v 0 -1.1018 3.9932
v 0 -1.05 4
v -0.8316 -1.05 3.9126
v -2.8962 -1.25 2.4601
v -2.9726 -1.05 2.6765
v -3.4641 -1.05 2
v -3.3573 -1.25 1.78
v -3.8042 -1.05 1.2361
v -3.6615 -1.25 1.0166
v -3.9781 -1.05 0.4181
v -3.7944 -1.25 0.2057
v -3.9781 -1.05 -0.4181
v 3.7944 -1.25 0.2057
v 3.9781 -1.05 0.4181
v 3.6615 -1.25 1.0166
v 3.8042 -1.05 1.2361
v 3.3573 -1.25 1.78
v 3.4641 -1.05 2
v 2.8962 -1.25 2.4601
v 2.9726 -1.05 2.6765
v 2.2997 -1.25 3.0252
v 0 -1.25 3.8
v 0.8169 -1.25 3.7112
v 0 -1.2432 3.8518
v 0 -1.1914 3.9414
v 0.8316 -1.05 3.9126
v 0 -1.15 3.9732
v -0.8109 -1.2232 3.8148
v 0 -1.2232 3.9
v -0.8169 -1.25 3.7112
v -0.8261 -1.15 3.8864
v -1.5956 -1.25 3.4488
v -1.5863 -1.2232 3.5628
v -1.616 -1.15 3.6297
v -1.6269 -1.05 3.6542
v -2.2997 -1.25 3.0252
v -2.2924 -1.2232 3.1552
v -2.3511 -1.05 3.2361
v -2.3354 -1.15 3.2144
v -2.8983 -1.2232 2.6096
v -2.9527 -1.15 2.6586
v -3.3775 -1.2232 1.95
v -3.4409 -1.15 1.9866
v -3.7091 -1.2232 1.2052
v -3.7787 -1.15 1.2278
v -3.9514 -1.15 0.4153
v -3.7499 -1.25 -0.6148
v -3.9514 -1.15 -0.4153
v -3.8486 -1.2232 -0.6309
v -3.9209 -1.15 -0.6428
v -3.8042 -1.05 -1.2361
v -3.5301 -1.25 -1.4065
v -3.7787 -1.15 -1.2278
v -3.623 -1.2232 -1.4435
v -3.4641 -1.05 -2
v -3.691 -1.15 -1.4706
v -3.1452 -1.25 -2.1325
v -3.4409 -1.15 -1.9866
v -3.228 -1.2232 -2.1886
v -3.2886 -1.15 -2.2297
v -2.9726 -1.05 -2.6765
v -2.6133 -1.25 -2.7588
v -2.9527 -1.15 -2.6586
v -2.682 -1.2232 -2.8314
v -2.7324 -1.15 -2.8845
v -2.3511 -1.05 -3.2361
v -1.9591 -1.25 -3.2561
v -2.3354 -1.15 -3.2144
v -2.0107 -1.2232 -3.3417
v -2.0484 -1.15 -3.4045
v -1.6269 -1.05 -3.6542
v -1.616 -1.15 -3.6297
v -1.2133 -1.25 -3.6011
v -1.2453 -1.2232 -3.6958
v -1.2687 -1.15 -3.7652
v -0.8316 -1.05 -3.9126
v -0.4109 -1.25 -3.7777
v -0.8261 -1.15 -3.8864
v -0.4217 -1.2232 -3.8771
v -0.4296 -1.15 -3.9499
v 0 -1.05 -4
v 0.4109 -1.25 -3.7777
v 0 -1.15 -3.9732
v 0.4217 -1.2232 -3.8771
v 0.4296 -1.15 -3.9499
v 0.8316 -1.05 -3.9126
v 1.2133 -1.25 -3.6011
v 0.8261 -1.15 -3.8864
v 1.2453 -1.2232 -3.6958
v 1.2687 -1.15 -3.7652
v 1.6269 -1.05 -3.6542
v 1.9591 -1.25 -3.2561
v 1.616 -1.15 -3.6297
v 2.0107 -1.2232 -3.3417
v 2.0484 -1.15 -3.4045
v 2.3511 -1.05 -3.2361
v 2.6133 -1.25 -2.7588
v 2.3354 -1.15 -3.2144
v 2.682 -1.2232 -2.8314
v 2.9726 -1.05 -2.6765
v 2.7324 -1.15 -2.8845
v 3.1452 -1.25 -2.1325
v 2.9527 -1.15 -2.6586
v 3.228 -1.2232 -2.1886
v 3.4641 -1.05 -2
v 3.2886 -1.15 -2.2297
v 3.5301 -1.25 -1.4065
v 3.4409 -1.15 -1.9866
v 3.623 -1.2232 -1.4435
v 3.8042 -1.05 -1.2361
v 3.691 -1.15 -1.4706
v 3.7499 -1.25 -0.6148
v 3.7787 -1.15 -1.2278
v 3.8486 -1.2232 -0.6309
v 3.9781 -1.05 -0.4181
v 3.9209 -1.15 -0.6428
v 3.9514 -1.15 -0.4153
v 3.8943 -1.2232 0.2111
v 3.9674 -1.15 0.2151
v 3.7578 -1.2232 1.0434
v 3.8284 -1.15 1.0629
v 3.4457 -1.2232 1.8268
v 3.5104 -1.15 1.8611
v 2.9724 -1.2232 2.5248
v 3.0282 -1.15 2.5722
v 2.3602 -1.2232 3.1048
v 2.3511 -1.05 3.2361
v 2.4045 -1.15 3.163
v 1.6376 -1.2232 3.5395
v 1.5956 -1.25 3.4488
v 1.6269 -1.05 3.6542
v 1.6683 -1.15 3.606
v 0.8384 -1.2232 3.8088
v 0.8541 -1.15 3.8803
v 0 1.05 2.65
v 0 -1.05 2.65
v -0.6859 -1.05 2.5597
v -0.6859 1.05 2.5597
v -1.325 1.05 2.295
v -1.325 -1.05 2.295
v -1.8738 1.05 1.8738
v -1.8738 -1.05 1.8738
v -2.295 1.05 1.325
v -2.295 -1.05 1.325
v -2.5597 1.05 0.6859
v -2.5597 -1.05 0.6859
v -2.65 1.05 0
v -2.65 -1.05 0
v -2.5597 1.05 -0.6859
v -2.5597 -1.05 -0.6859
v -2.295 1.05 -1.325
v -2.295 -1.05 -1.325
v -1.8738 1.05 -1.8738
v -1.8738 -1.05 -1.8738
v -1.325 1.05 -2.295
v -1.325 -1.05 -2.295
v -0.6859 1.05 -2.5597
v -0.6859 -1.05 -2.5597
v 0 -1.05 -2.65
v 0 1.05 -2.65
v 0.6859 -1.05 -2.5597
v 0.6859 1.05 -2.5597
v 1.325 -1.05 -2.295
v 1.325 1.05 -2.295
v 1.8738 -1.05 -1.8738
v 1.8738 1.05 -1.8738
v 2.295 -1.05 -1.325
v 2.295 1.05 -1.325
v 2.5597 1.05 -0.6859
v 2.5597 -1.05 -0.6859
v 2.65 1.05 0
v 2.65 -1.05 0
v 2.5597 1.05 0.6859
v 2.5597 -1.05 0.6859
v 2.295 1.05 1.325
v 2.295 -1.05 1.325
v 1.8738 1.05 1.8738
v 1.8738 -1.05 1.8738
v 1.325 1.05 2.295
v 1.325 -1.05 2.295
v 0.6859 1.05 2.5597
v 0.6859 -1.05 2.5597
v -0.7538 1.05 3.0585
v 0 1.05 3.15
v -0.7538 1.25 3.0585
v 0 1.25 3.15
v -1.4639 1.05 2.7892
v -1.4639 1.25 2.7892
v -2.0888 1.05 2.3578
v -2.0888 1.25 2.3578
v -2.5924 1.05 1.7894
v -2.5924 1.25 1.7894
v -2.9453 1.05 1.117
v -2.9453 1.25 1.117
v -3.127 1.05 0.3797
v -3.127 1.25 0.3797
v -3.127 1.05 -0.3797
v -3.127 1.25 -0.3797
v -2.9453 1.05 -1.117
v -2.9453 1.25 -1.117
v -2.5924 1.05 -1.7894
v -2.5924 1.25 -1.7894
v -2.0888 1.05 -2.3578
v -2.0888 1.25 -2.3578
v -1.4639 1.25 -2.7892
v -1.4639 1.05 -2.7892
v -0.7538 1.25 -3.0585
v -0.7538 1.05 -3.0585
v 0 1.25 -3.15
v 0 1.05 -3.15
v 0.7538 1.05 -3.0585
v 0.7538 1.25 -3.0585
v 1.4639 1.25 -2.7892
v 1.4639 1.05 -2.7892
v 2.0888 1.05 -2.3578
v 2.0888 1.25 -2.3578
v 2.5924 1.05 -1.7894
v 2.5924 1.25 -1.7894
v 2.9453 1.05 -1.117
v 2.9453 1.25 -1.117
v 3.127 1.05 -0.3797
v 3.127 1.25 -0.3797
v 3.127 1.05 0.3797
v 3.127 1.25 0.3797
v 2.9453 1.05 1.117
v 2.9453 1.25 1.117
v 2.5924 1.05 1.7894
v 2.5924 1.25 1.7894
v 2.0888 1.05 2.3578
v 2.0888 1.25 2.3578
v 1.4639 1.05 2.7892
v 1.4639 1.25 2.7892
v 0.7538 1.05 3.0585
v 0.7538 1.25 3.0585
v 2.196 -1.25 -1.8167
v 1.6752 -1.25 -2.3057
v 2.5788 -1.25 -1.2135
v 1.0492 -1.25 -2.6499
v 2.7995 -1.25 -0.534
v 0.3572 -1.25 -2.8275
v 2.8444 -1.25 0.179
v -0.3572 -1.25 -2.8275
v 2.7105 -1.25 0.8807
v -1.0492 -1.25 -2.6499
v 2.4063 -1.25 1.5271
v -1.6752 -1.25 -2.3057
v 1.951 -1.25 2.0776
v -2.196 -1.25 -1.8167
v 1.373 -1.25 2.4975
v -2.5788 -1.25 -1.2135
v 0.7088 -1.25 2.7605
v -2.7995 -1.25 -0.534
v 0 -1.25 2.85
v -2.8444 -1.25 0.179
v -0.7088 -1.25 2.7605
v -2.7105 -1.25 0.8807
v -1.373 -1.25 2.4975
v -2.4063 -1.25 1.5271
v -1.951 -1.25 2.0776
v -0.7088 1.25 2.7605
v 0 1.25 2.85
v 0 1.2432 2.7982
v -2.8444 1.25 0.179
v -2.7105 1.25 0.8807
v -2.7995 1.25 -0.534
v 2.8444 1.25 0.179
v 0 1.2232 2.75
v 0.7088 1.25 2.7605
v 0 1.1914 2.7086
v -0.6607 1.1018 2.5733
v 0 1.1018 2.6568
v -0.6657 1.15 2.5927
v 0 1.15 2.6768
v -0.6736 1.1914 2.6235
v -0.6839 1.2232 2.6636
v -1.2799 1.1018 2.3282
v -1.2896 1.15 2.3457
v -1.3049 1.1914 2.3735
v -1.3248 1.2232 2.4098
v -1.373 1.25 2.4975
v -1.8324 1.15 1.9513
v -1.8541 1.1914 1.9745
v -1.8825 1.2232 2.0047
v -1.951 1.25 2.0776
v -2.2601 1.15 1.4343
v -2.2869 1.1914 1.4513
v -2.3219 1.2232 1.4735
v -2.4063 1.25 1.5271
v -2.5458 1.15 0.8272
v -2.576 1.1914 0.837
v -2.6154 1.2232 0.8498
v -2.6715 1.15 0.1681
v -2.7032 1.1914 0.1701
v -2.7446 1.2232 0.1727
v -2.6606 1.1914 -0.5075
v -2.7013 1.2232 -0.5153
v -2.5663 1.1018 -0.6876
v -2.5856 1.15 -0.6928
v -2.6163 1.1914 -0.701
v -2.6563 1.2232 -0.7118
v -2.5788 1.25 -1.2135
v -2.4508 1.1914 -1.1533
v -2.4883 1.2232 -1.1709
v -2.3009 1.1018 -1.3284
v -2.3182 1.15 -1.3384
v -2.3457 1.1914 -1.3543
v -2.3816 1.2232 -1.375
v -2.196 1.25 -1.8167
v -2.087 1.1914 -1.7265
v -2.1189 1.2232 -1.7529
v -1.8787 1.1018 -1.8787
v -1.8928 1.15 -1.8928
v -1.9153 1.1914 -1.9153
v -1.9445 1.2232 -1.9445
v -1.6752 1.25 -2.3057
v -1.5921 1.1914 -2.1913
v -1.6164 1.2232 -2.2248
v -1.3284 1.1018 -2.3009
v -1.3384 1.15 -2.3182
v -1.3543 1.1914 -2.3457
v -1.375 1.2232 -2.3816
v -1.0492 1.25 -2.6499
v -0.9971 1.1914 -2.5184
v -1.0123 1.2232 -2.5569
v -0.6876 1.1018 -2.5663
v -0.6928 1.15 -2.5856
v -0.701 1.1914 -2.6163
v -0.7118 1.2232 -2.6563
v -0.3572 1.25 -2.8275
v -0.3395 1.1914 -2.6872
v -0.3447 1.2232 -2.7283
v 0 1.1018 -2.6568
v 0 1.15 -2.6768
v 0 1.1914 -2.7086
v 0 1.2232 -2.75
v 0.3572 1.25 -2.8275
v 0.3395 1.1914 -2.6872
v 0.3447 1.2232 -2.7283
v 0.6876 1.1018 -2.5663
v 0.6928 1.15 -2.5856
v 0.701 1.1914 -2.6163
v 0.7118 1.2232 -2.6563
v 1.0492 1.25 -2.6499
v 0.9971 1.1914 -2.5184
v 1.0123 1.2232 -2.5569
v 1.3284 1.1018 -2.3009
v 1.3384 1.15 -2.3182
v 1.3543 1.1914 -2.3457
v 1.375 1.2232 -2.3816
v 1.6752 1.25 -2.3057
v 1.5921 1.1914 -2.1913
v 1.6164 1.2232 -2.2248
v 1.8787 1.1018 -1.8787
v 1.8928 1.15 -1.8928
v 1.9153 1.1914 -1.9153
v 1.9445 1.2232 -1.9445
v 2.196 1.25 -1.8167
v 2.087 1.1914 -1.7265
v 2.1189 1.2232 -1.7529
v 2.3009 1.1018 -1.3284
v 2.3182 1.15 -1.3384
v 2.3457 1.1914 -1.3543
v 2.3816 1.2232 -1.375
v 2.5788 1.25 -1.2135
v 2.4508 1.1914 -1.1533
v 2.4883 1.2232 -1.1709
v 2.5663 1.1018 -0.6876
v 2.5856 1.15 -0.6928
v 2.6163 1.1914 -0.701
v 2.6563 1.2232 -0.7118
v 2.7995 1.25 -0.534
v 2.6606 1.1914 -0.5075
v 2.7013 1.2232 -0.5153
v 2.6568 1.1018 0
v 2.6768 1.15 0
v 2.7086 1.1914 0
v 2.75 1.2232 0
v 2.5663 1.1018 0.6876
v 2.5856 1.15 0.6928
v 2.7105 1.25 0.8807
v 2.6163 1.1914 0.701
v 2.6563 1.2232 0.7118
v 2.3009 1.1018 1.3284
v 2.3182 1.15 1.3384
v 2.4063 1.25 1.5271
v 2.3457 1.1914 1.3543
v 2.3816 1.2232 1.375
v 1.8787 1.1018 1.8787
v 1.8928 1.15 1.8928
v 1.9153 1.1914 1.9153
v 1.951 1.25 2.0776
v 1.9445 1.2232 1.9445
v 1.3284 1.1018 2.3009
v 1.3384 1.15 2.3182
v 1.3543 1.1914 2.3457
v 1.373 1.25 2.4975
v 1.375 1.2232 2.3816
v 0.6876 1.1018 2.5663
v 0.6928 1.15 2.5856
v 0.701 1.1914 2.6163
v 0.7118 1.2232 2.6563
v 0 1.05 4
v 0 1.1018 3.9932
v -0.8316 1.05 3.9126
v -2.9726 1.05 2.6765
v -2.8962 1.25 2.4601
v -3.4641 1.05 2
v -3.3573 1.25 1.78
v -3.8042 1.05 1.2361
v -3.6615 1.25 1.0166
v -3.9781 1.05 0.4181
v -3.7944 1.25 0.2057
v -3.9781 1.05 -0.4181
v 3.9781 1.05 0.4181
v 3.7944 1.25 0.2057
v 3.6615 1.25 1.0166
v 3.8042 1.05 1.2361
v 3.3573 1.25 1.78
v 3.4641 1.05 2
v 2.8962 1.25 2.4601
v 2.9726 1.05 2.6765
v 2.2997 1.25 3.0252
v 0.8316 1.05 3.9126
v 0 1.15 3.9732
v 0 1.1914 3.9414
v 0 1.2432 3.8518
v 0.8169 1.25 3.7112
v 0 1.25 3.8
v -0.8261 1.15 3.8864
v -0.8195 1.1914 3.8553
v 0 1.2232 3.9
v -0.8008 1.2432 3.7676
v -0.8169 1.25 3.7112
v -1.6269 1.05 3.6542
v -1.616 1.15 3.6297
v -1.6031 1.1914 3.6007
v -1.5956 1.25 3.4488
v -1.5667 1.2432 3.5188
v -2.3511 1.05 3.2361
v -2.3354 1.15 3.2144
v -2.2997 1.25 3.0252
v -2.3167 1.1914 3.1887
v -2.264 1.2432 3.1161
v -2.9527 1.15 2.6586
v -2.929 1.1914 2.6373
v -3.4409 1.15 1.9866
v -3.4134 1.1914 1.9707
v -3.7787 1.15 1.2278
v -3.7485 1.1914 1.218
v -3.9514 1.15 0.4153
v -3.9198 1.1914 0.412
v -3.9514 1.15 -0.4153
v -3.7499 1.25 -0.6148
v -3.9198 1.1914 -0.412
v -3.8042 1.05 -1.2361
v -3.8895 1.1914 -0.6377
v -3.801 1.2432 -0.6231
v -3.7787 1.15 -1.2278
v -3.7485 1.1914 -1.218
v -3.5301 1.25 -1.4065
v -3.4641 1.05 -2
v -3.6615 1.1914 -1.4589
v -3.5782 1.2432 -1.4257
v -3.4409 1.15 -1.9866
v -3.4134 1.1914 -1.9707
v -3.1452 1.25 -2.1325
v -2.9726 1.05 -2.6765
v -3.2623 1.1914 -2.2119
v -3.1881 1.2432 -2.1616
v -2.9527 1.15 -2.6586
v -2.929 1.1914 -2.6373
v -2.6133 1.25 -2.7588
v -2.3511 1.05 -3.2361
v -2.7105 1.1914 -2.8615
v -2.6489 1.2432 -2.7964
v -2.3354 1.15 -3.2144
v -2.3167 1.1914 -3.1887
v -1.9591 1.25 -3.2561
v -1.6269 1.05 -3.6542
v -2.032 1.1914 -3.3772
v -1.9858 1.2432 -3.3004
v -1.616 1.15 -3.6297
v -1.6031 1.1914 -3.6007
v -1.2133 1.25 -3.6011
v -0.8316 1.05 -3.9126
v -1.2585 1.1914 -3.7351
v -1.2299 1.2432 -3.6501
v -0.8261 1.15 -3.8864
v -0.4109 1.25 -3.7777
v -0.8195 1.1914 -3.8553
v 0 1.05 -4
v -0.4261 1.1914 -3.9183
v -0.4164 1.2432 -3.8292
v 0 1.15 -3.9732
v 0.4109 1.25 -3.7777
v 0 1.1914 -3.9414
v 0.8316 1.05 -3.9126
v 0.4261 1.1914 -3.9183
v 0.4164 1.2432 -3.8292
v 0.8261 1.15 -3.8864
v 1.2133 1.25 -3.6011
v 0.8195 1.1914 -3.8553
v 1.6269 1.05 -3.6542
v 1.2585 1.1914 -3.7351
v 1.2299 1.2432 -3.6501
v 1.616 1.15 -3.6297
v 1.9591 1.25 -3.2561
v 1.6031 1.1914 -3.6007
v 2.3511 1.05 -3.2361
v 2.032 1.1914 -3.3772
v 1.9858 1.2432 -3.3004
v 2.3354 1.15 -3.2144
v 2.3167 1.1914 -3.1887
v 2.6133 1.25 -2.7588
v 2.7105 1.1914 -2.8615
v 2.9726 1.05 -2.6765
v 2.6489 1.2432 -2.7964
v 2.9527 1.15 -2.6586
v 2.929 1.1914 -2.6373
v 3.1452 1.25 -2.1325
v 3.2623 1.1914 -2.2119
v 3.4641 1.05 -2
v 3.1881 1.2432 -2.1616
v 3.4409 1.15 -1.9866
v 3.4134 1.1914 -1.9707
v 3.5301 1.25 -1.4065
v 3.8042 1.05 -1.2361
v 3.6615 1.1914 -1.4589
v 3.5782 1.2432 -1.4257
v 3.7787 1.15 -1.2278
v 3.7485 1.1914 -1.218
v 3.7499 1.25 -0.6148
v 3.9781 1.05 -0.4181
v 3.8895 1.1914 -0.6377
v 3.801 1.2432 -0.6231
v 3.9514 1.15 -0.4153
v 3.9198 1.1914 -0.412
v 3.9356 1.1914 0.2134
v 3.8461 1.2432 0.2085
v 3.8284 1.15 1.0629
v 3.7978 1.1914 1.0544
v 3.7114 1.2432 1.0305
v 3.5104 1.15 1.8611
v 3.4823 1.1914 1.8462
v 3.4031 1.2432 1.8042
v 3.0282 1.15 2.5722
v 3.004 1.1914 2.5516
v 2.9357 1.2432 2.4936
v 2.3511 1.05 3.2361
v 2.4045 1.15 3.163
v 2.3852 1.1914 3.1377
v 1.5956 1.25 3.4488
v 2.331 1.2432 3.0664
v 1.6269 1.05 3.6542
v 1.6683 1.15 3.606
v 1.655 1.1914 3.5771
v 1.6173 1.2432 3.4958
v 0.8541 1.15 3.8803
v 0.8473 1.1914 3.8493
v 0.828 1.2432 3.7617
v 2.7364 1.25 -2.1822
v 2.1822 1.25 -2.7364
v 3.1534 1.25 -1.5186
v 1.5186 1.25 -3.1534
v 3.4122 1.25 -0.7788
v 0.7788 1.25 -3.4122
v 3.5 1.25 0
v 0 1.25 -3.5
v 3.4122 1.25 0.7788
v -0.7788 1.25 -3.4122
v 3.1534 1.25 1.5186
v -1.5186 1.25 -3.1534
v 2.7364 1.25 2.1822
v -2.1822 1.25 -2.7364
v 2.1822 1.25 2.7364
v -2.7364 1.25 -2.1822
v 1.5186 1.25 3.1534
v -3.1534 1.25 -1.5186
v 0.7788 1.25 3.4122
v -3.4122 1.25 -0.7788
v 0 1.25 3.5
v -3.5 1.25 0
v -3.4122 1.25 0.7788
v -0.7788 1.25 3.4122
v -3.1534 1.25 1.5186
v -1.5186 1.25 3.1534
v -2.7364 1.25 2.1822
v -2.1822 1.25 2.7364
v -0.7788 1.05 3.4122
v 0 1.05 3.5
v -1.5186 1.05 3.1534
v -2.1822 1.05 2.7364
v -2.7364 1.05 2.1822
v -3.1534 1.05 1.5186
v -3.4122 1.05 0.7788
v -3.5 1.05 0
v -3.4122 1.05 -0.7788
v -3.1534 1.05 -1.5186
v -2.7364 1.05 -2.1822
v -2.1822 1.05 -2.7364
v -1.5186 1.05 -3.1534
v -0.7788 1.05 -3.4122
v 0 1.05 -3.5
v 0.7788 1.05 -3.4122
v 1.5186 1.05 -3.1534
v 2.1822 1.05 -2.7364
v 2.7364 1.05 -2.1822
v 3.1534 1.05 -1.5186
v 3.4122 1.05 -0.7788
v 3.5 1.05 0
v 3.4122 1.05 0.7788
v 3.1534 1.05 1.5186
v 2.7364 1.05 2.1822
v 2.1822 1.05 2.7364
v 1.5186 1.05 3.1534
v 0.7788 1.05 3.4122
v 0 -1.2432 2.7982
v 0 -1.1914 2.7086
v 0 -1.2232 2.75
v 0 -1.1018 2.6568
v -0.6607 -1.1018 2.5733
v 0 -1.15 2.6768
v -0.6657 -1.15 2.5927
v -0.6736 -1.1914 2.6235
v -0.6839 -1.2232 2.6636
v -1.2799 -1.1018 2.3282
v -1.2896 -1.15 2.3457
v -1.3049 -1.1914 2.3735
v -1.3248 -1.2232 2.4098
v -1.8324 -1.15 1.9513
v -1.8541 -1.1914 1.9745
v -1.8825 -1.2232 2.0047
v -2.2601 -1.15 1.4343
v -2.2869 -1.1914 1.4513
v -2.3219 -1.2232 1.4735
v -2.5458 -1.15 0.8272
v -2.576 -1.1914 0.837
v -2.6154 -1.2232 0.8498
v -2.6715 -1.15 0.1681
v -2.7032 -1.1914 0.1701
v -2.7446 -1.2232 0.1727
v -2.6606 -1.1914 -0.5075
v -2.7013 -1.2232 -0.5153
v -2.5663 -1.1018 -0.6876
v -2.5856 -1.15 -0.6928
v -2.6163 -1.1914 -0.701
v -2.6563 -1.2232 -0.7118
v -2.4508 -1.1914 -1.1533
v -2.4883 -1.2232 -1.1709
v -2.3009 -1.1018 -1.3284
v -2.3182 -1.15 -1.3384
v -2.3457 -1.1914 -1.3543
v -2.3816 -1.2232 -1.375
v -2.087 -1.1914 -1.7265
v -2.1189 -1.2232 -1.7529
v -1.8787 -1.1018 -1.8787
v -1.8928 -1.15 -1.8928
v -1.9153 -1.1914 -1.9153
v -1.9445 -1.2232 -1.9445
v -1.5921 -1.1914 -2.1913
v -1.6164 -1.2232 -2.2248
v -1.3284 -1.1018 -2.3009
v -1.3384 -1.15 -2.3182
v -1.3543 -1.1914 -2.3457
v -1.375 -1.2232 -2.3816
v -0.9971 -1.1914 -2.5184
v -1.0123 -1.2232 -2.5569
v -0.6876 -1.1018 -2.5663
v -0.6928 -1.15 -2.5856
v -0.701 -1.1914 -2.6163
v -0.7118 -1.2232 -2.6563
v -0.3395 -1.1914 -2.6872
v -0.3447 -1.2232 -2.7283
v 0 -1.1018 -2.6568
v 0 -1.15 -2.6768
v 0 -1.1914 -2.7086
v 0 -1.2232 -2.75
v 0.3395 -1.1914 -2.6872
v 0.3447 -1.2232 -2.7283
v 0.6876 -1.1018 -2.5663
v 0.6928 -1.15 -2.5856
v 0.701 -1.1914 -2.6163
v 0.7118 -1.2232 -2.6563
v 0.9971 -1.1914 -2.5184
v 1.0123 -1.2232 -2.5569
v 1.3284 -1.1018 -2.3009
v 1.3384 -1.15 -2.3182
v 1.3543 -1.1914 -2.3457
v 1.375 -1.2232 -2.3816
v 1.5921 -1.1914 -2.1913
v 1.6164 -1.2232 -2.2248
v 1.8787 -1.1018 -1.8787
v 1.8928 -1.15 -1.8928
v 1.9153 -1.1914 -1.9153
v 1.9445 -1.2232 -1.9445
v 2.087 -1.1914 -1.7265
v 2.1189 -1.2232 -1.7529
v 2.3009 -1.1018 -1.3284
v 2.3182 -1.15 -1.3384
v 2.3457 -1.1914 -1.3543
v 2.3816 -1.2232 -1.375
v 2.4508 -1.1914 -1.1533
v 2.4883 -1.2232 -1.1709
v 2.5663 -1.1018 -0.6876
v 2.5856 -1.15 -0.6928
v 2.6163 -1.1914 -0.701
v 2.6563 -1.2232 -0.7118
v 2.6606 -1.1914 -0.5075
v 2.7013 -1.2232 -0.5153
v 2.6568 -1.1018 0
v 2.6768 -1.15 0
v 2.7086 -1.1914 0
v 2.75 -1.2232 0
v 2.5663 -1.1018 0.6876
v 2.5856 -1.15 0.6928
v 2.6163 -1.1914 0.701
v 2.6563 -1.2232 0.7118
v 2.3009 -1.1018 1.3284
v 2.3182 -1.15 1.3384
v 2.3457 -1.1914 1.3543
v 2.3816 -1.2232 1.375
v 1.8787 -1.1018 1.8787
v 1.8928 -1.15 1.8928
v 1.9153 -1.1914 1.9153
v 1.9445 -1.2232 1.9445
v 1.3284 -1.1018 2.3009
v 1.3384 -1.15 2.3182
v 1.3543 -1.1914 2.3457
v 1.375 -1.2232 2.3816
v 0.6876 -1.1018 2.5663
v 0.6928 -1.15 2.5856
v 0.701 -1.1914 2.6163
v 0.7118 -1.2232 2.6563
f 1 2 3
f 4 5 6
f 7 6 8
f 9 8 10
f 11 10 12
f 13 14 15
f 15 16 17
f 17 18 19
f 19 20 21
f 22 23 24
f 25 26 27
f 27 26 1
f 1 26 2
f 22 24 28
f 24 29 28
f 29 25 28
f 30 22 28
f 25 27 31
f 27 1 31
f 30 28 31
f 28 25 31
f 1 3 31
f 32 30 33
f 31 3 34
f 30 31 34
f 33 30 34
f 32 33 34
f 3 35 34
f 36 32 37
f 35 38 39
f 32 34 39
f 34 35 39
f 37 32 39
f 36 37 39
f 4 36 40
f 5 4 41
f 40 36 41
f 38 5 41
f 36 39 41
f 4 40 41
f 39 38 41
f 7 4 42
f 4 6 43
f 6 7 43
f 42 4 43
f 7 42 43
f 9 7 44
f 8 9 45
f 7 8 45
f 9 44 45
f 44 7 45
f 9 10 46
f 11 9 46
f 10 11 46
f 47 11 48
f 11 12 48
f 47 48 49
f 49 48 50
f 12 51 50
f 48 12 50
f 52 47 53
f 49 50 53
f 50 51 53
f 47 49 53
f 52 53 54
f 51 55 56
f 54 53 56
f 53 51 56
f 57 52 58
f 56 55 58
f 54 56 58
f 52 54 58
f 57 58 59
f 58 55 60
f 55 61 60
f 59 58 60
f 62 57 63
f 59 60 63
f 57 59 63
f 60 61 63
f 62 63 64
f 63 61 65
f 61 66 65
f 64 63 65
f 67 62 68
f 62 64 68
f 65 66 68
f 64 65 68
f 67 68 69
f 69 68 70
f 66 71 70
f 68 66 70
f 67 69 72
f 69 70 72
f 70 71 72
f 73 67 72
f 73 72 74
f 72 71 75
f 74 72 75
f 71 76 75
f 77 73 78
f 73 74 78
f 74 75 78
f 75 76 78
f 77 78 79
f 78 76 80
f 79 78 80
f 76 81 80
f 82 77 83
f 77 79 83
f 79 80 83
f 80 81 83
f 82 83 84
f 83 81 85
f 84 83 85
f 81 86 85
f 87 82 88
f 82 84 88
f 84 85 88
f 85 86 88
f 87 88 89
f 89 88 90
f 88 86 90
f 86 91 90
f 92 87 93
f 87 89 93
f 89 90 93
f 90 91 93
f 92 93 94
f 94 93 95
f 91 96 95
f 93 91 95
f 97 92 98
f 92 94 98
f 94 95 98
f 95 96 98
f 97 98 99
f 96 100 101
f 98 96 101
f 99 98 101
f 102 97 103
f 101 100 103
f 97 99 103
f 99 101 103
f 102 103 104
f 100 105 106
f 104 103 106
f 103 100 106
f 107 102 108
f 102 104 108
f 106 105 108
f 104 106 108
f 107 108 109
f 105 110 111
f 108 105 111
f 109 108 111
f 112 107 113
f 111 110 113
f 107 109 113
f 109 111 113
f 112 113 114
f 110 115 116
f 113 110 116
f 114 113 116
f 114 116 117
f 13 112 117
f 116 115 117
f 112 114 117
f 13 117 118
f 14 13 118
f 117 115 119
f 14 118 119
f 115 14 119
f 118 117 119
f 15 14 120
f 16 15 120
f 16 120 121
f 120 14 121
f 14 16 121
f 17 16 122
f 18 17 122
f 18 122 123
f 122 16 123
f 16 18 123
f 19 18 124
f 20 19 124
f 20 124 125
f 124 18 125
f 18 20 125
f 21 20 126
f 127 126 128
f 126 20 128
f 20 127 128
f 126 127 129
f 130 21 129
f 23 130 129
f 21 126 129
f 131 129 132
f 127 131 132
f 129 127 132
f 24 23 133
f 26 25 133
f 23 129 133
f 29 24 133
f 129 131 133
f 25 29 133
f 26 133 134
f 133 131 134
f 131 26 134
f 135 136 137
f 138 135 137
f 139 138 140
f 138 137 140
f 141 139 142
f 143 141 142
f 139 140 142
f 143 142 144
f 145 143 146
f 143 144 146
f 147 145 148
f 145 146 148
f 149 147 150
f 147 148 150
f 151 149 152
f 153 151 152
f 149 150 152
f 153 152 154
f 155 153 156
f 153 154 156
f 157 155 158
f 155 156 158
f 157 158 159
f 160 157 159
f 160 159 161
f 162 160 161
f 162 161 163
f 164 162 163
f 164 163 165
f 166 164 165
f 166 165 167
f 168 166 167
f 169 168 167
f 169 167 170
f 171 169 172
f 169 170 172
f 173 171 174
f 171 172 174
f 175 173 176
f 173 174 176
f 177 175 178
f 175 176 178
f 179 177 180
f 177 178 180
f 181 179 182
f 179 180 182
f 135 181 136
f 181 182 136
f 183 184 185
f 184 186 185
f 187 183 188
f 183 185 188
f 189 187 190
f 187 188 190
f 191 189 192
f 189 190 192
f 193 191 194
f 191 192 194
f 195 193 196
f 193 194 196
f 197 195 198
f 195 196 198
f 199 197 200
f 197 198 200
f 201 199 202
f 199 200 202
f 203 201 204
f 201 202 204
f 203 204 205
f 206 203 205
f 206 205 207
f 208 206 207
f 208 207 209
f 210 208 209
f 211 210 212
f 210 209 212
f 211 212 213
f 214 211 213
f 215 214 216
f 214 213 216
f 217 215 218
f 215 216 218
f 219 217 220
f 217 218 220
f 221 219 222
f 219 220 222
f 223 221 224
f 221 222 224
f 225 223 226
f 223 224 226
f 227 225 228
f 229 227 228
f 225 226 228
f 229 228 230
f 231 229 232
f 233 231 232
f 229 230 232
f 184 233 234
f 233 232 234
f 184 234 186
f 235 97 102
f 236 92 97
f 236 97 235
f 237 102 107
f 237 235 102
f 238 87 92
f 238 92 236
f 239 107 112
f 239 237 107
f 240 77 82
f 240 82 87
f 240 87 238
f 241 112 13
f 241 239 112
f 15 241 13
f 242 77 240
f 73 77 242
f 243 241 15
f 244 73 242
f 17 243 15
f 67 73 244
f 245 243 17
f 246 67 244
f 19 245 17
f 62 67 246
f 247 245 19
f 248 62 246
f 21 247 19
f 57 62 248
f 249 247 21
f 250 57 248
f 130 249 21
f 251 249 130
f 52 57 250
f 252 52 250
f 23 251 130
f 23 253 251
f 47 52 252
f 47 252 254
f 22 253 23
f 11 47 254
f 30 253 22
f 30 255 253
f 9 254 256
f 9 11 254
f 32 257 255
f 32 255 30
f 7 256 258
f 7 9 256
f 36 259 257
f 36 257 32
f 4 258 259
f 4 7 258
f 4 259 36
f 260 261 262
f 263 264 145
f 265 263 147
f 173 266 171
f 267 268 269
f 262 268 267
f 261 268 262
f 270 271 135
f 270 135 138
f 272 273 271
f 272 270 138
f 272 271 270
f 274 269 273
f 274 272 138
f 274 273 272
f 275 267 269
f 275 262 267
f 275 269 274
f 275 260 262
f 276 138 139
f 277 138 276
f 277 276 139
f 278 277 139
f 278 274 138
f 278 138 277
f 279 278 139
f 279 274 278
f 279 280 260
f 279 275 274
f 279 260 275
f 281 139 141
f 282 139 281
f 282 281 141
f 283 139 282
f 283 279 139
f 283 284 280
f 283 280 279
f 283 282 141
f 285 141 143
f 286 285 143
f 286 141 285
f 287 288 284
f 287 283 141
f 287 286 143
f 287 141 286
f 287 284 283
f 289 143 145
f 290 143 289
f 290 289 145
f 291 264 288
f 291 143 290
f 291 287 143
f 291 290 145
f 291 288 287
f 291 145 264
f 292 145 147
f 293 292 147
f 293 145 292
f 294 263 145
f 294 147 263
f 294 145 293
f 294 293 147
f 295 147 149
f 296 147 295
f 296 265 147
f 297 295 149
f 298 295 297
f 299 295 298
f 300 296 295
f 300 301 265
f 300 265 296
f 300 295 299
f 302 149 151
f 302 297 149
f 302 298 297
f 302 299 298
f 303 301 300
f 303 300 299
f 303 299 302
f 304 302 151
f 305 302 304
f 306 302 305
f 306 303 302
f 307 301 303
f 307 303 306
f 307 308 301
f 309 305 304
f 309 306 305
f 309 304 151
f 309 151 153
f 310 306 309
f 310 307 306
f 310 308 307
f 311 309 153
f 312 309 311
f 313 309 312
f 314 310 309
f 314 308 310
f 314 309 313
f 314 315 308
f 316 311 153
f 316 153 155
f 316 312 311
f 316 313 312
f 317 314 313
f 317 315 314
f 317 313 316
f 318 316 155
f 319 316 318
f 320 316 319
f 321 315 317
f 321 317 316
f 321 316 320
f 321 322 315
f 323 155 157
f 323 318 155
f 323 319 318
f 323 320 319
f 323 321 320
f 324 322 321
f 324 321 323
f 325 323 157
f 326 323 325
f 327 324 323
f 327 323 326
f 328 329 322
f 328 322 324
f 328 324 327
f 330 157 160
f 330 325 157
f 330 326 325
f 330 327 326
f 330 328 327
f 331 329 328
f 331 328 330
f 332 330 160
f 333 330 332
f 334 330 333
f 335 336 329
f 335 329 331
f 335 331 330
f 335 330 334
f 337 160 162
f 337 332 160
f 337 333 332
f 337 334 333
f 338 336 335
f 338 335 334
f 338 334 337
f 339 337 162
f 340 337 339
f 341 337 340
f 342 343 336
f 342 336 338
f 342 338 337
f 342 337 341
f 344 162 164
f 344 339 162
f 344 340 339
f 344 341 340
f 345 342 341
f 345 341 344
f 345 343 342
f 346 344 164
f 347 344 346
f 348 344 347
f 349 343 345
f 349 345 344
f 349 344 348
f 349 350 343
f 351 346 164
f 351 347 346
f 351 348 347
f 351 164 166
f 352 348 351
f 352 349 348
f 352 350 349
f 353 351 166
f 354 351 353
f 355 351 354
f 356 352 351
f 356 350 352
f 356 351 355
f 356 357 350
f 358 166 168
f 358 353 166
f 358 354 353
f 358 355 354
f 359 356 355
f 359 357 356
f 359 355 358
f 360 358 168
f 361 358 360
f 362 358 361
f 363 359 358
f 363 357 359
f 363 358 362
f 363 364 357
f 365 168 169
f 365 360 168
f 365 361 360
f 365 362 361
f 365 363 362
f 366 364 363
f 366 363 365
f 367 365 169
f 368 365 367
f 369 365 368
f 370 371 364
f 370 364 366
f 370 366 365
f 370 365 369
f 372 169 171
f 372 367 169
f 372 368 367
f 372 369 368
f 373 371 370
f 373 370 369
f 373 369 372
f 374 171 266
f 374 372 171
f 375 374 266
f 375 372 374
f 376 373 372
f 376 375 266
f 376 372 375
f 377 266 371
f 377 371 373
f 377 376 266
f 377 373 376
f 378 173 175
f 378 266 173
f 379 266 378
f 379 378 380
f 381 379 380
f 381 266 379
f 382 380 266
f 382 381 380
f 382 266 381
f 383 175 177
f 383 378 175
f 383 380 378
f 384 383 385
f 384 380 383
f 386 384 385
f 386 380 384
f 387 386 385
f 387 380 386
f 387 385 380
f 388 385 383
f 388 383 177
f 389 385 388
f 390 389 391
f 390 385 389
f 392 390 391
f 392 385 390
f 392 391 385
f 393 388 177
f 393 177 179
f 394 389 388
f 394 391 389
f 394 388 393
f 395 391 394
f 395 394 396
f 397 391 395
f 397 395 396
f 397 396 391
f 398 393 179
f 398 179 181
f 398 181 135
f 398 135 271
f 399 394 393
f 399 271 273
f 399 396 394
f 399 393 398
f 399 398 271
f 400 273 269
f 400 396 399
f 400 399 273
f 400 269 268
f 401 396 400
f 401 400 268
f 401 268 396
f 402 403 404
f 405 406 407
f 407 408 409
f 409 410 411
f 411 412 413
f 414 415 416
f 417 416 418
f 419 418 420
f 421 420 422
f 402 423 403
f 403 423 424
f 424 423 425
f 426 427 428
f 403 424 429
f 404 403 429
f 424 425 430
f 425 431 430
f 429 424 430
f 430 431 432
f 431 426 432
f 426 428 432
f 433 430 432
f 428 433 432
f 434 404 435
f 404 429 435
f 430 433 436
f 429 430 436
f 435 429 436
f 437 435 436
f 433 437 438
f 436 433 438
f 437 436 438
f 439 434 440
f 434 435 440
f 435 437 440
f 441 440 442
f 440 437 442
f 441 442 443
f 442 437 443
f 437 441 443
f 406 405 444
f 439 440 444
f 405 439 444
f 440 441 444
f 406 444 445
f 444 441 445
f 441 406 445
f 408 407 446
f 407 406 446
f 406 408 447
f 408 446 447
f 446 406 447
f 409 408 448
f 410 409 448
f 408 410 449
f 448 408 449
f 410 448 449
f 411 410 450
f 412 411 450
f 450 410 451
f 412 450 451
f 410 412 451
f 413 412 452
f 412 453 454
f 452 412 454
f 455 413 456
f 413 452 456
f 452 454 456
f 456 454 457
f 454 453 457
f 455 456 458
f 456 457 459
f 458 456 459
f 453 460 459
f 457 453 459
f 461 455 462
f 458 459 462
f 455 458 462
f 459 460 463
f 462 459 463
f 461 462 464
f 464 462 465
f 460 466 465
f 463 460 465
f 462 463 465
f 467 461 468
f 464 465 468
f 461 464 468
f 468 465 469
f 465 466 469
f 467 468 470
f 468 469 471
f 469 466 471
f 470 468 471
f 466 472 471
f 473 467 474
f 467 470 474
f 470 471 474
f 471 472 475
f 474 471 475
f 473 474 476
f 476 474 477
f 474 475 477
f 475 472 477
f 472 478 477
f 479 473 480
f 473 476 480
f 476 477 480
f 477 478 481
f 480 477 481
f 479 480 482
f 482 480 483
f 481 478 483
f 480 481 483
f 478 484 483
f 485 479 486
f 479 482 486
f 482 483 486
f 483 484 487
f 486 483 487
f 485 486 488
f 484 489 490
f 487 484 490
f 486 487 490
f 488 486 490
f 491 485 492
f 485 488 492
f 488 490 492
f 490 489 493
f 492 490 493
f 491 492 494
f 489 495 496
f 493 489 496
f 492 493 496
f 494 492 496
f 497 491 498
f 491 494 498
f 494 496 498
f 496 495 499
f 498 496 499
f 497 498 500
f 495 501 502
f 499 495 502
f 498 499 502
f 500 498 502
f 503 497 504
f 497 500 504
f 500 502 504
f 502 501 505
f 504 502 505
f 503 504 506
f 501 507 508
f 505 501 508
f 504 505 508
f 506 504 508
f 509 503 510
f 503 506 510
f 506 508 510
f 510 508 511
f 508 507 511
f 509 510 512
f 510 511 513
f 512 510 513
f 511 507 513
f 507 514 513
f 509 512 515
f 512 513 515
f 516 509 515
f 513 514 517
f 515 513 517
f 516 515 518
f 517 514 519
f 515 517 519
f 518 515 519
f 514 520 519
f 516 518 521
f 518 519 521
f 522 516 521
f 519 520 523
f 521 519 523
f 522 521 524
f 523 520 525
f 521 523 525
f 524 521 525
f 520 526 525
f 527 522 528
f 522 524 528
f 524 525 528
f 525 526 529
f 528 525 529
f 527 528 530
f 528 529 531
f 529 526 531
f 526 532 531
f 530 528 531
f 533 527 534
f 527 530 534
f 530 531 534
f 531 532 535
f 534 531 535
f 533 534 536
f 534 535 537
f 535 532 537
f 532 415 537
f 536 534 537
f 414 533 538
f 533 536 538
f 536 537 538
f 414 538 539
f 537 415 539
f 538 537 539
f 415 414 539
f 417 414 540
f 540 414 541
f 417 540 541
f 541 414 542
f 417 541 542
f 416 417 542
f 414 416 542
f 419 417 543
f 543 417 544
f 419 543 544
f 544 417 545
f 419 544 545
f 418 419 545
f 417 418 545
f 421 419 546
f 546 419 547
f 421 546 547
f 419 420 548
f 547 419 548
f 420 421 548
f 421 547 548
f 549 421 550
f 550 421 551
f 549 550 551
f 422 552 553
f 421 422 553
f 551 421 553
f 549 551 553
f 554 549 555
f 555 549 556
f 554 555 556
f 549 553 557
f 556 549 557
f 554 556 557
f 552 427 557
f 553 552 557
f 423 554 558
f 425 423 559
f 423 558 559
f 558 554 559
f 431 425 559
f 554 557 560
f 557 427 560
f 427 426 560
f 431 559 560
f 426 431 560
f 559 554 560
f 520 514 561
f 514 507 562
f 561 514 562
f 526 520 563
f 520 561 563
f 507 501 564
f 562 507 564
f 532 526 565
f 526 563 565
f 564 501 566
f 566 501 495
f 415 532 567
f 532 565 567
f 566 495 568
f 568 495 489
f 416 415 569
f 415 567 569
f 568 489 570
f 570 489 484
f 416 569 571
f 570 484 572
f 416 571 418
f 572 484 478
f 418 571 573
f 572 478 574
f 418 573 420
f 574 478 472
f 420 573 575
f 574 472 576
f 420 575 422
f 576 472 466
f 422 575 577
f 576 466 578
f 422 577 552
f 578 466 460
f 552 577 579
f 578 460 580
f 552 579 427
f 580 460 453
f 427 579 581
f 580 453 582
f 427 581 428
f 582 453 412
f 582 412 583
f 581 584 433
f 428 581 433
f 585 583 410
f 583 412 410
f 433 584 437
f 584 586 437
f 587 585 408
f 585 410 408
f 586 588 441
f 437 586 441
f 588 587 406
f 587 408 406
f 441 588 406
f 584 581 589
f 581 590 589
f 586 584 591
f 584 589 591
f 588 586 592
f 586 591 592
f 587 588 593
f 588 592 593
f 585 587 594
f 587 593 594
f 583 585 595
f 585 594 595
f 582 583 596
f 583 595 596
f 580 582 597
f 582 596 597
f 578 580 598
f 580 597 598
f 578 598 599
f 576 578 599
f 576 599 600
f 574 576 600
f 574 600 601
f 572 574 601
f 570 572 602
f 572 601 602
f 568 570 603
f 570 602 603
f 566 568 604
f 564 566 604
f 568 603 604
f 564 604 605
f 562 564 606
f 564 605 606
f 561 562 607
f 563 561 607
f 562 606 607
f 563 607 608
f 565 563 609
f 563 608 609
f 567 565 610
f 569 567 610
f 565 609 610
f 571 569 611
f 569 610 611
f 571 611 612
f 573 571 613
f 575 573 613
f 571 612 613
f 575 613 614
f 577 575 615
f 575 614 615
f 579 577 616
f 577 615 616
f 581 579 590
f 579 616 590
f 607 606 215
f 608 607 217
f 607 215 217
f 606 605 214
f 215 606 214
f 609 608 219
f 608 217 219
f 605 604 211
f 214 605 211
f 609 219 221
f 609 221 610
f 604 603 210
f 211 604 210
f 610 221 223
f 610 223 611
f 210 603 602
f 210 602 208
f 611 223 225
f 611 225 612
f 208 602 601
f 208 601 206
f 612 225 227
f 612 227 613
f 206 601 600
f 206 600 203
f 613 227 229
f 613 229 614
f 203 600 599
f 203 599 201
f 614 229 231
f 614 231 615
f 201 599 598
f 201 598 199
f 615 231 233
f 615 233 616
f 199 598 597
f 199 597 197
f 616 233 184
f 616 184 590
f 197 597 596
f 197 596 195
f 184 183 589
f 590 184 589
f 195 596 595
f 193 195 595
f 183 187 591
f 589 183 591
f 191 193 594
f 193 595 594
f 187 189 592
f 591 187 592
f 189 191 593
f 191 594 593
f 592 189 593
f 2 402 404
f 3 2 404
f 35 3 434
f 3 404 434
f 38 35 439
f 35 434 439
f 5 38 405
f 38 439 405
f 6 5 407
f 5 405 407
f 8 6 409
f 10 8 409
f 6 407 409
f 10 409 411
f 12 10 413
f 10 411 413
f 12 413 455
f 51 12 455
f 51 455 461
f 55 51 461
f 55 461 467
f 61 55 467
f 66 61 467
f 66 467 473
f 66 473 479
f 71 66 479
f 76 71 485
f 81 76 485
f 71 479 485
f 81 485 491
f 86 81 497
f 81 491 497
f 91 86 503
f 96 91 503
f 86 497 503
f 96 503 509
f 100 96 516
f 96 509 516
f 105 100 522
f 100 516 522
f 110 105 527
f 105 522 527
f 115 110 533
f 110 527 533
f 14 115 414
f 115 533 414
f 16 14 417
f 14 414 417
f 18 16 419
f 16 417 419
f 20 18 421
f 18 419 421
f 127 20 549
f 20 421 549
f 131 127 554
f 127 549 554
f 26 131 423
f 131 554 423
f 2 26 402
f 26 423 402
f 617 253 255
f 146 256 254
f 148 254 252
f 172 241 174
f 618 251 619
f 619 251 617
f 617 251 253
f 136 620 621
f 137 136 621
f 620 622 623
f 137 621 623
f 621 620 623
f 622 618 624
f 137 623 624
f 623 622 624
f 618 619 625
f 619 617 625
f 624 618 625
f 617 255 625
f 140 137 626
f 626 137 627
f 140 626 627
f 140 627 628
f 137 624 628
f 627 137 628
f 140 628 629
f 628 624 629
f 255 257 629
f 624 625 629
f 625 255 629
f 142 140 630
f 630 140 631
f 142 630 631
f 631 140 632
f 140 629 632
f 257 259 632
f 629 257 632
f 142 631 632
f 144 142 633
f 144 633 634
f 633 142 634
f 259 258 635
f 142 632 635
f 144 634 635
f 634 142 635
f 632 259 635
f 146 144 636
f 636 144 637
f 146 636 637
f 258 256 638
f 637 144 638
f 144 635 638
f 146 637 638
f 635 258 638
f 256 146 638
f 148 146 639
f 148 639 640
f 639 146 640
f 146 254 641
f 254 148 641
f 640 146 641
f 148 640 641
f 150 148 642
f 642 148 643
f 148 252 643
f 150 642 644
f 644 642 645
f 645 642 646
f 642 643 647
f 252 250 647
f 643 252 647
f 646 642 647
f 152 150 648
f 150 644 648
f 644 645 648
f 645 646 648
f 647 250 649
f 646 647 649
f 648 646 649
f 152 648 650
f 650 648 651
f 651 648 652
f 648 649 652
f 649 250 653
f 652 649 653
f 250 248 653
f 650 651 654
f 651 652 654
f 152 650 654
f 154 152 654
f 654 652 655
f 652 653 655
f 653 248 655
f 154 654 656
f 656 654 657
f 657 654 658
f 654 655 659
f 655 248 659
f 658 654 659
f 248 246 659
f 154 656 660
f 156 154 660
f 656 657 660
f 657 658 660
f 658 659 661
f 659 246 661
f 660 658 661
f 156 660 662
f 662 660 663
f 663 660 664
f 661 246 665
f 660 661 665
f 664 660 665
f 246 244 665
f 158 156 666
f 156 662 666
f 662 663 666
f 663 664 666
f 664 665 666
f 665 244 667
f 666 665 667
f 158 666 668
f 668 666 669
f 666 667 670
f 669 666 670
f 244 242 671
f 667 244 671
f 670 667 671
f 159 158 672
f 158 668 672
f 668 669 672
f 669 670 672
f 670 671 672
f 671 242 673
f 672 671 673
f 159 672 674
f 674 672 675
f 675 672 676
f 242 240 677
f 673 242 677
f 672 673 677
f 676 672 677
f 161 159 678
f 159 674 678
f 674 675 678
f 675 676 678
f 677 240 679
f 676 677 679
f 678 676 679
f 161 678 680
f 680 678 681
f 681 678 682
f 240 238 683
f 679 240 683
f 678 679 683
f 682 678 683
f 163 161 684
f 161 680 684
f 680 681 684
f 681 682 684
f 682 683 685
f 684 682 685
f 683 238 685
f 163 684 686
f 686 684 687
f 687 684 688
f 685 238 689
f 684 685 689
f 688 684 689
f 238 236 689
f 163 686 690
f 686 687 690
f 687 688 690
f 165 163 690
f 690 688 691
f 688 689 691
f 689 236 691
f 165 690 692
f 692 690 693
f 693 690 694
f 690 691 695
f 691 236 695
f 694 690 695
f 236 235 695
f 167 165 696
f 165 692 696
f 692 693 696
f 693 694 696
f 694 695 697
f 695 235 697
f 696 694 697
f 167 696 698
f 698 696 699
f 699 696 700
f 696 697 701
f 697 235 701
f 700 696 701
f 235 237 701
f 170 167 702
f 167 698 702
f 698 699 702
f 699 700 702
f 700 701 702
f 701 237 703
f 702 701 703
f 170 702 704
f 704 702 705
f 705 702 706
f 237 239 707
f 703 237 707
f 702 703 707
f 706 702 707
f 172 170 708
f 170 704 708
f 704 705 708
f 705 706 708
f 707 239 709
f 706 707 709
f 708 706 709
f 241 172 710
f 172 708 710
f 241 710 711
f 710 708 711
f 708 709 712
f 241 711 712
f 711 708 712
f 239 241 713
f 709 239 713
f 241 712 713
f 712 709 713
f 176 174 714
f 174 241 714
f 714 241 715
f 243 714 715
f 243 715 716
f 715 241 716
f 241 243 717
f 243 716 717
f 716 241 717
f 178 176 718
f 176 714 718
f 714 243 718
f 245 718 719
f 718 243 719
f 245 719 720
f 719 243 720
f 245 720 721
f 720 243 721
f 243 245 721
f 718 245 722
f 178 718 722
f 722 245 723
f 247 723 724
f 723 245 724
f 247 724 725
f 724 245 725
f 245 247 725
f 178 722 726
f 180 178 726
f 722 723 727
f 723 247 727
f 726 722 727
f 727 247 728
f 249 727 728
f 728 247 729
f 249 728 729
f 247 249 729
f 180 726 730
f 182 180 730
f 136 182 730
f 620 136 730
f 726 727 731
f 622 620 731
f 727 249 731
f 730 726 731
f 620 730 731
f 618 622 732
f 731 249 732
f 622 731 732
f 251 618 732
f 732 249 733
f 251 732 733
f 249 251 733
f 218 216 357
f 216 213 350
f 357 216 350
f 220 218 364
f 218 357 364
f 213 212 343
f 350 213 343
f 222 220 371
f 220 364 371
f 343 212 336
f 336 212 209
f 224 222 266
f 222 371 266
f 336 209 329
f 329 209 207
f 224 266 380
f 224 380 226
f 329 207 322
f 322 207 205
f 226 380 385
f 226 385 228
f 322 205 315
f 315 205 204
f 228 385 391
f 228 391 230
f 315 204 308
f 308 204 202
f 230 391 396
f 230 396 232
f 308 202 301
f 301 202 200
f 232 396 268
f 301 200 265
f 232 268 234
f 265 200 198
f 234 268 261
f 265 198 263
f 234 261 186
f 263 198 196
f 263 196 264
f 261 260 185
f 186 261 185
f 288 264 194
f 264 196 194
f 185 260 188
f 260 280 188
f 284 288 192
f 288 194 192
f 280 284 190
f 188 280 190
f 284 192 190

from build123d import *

# Parameters (mm, degrees)
FILLET1_R           = 0.2
SKETCH2_R           = 3.5
SKETCH2_R_2         = 3.15
BOSS_EXTRUDE1_DEPTH = 0.2


with BuildPart() as part:
    # Sketch1 → Revolve1 (revolve)
    with BuildSketch(Plane(origin=(0, 0, 0), x_dir=(0, 0, -1), z_dir=(1, 0, 0)), mode=Mode.PRIVATE) as revolve1_sk:
        Polygon((2.65, 1.25), (2.65, -1.25), (3.15, -1.25), (3.15, -1.05), (3.5, -1.05), (3.5, -1.25), (4, -1.25), (4, 1.25), (3.5, 1.25), (3.5, 1.05), (3.15, 1.05), (3.15, 1.25), align=None)
    revolve(revolve1_sk.sketch.rotate(Axis((0, 1.193675889, 0), (0, -1, 0)), 180), axis=Axis((0, 1.193675889, 0), (0, -1, 0)))

    # Fillet1
    fillet1_edges = [part.edges().sort_by_distance(p)[0] for p in [
        (0, 1.25, -4),
        (0, -1.25, -4),
        (0, -1.25, -2.65),
        (0, 1.25, -2.65),
    ]]
    fillet(fillet1_edges, radius=FILLET1_R)

    # Sketch2 → Boss-Extrude1 (add)
    with BuildSketch(Plane.XZ.offset(1.05)):
        with Locations(Location((0, 0, 0), (0, 0, 90))):
            Circle(SKETCH2_R)
        with Locations(Location((0, 0, 0), (0, 0, 90))):
            Circle(SKETCH2_R_2, mode=Mode.SUBTRACT)
    extrude(amount=BOSS_EXTRUDE1_DEPTH)


solid = part.part
